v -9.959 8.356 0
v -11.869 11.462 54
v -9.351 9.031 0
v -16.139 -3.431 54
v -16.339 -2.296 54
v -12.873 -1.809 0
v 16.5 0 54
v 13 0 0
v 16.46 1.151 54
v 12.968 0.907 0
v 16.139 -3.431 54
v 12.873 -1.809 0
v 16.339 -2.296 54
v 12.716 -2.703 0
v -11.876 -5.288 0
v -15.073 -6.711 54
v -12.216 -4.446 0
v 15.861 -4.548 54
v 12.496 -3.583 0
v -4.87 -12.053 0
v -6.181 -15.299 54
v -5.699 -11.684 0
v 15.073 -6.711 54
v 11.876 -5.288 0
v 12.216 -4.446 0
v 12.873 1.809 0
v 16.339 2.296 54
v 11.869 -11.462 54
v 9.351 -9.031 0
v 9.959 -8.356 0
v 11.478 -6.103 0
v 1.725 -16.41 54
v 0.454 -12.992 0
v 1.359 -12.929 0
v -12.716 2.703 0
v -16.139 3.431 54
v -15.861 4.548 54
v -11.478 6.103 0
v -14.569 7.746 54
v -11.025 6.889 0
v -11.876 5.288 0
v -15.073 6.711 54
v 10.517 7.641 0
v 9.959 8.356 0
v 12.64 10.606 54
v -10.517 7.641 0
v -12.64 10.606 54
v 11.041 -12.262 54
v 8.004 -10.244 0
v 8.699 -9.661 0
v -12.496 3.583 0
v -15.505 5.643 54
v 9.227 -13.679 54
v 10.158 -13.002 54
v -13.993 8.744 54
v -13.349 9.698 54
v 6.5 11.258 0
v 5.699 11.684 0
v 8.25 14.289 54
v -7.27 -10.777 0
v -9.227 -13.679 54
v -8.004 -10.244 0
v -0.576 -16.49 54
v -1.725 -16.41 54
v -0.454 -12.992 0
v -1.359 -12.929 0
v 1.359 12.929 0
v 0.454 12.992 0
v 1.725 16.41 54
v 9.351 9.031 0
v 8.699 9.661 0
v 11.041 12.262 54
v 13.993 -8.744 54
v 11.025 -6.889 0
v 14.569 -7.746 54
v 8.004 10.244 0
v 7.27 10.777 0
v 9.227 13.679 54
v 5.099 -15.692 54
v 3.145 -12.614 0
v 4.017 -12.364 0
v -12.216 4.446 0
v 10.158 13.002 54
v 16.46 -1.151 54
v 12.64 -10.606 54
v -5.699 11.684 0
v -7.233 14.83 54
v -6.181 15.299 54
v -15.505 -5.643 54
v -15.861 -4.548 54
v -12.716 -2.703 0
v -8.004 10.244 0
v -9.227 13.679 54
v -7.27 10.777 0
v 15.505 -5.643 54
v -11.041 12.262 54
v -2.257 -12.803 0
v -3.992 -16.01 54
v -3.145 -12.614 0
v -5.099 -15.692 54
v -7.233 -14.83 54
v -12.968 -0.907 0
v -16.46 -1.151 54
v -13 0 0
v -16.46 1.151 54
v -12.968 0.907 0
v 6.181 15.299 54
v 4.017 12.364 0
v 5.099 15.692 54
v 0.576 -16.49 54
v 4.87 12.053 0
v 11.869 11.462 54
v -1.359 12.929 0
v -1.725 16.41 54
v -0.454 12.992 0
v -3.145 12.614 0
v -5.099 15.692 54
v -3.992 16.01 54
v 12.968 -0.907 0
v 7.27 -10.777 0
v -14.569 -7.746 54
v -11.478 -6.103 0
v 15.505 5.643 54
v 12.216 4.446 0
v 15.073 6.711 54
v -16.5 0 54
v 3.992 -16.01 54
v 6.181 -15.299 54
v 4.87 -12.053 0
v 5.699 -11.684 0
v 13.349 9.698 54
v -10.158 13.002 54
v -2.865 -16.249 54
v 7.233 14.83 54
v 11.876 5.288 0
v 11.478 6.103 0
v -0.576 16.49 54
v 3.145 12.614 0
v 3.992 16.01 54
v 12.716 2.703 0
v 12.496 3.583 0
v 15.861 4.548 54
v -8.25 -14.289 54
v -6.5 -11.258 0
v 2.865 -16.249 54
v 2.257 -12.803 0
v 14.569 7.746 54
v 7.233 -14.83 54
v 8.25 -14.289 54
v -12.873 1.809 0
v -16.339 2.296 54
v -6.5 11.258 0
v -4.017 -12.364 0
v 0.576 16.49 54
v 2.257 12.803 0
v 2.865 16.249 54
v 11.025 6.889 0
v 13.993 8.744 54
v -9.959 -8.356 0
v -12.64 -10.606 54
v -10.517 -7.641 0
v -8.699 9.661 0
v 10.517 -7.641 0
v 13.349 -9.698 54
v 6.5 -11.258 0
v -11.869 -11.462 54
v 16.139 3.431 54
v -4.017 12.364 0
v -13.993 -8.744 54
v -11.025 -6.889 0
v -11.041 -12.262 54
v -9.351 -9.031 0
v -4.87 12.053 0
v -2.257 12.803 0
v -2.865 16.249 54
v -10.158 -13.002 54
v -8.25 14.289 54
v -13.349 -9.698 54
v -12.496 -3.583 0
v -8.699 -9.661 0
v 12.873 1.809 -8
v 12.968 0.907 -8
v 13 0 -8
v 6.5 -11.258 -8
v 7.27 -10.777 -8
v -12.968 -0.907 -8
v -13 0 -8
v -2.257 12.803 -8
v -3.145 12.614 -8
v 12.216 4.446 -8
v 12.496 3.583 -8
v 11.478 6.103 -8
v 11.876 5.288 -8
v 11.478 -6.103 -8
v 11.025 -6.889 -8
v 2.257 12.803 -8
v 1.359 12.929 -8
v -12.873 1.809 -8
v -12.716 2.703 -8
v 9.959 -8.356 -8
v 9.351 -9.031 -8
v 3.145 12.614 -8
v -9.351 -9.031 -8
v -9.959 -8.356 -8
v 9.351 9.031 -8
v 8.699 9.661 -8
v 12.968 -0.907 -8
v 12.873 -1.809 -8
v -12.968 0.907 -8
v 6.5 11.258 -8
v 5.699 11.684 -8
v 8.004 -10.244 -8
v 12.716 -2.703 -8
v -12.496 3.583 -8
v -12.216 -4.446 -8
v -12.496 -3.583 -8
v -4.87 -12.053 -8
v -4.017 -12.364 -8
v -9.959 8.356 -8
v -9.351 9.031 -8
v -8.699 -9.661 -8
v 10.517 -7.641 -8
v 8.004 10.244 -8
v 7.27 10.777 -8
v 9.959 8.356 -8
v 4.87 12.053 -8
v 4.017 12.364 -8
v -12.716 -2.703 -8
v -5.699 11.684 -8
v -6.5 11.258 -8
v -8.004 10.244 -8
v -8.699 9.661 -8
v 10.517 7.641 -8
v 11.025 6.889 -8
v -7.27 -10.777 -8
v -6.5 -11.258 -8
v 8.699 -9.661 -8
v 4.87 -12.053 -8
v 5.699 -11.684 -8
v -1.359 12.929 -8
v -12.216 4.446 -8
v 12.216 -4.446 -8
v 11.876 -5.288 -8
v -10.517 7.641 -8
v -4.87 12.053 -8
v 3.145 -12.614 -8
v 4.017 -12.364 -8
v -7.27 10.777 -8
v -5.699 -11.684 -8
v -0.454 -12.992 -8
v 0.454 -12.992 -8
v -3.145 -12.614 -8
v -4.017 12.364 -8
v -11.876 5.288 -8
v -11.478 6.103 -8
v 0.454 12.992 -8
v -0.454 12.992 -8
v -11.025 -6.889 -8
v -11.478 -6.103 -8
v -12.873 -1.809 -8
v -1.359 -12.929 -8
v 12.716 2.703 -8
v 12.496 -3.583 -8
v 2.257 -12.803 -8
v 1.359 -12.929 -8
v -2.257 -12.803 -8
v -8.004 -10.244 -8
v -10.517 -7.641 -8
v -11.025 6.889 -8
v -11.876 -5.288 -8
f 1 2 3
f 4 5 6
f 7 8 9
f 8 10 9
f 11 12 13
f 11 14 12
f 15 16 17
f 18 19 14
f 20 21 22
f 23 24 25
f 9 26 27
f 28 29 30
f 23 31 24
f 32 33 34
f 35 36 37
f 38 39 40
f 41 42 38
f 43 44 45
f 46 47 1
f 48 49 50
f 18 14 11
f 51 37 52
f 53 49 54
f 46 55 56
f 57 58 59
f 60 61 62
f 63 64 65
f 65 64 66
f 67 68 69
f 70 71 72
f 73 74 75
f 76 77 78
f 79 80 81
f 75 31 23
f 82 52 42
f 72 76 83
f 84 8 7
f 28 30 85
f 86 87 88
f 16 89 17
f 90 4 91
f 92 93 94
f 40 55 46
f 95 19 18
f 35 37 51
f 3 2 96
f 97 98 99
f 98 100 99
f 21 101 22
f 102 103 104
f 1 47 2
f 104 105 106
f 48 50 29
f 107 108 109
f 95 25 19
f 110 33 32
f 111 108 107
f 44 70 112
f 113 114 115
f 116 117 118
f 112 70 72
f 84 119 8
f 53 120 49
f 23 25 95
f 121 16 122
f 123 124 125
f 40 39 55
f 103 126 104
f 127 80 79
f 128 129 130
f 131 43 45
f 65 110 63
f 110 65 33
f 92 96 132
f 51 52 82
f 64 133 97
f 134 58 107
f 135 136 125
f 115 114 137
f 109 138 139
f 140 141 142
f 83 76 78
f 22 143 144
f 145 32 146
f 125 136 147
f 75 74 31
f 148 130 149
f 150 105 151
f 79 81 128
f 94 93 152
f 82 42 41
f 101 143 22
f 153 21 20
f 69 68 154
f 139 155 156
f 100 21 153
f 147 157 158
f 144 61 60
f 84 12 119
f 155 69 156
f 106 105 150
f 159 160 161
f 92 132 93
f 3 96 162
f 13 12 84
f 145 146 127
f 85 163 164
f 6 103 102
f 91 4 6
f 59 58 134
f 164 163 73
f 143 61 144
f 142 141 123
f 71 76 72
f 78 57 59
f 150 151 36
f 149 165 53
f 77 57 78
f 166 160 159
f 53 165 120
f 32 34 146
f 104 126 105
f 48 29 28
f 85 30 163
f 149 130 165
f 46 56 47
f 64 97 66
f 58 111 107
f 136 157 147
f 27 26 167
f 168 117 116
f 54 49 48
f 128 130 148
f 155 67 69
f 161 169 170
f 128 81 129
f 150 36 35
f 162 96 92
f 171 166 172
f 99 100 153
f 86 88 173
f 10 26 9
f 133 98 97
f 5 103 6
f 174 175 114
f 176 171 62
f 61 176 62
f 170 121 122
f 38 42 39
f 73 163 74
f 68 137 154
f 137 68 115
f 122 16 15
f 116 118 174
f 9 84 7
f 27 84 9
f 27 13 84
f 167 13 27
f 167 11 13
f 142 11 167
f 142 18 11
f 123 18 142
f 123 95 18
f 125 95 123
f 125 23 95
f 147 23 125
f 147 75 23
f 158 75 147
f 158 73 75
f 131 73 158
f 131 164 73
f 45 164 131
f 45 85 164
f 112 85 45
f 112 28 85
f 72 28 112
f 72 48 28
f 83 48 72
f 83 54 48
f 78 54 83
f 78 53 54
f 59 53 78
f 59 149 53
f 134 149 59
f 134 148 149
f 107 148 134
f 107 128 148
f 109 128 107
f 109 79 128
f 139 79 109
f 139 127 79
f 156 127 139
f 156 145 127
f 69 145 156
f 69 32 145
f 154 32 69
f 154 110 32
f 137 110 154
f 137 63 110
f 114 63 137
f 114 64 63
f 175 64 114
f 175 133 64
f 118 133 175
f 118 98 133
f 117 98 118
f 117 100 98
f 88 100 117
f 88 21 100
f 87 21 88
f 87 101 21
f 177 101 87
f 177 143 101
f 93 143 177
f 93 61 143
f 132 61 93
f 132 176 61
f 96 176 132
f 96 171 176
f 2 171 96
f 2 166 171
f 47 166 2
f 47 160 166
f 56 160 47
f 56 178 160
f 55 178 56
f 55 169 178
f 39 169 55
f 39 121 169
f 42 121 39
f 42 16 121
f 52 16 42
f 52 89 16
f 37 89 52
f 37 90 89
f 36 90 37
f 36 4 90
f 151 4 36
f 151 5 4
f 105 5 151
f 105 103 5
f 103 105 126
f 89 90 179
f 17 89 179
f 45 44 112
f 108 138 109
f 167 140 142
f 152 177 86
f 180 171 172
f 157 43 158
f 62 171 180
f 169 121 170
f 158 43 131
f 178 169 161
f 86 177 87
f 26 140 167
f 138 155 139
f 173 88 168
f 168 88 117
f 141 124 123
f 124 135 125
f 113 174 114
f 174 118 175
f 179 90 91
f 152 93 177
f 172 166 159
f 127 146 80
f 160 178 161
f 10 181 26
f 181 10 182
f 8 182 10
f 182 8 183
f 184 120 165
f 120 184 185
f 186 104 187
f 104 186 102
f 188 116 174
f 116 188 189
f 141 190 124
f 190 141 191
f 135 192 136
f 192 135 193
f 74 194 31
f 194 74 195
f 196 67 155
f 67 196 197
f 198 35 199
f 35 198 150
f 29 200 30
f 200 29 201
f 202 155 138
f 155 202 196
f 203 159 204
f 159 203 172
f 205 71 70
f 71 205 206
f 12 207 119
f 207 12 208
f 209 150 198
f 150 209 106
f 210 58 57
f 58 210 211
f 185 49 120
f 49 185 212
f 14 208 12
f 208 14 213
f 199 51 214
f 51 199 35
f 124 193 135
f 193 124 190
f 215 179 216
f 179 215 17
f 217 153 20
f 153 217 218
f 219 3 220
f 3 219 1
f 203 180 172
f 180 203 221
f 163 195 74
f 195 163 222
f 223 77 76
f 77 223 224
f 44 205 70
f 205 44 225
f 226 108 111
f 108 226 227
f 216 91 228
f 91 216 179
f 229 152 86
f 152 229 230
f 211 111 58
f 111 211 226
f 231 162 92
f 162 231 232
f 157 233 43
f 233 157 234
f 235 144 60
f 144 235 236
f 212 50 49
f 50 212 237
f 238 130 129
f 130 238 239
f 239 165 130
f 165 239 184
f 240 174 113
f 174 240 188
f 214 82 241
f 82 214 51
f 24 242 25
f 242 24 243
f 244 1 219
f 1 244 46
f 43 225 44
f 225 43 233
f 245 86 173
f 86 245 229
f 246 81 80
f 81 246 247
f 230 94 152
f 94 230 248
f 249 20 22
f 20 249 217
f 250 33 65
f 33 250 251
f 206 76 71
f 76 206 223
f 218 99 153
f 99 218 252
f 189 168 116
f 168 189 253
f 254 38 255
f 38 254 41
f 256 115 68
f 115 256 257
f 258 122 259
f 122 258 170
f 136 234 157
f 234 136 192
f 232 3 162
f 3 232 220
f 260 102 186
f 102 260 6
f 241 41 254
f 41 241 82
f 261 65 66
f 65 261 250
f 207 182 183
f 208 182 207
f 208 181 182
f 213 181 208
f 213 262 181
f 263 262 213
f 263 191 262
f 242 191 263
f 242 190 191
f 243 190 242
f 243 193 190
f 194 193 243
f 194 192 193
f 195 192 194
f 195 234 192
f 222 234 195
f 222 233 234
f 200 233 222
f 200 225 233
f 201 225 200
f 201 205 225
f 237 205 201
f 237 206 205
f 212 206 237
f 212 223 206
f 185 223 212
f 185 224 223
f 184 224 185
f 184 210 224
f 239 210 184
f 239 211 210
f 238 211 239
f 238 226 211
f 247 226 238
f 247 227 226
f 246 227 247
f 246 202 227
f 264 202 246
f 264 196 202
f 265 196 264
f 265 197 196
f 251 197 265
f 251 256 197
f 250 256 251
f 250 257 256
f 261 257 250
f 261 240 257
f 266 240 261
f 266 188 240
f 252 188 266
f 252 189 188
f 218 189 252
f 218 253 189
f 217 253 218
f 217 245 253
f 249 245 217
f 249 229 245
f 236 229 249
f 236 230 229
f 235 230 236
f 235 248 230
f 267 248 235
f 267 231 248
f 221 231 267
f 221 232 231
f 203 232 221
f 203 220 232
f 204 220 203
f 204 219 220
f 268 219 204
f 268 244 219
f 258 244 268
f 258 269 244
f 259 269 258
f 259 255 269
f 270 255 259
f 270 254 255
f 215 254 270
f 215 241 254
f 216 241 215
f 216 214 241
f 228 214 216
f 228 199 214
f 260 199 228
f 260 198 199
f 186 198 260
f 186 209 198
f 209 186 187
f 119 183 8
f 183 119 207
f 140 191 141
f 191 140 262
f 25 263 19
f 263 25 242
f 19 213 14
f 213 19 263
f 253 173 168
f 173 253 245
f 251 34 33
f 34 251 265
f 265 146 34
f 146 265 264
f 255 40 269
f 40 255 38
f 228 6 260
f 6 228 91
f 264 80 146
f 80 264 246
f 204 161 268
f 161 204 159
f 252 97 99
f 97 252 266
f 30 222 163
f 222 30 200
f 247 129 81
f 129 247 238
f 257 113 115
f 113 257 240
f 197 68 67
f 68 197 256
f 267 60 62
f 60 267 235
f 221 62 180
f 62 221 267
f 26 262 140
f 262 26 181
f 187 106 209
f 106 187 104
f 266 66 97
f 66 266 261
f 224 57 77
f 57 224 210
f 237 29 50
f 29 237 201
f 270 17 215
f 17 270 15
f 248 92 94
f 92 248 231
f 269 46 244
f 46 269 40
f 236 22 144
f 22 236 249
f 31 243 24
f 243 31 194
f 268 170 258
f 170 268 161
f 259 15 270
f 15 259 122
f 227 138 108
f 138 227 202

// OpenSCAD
$fn = 90;

cylinder(h = 62 - 8, d1 = 26, d2 = 33, center = false);
translate([0, 0, -8]) cylinder(h = 8, d = 26, center = false);
